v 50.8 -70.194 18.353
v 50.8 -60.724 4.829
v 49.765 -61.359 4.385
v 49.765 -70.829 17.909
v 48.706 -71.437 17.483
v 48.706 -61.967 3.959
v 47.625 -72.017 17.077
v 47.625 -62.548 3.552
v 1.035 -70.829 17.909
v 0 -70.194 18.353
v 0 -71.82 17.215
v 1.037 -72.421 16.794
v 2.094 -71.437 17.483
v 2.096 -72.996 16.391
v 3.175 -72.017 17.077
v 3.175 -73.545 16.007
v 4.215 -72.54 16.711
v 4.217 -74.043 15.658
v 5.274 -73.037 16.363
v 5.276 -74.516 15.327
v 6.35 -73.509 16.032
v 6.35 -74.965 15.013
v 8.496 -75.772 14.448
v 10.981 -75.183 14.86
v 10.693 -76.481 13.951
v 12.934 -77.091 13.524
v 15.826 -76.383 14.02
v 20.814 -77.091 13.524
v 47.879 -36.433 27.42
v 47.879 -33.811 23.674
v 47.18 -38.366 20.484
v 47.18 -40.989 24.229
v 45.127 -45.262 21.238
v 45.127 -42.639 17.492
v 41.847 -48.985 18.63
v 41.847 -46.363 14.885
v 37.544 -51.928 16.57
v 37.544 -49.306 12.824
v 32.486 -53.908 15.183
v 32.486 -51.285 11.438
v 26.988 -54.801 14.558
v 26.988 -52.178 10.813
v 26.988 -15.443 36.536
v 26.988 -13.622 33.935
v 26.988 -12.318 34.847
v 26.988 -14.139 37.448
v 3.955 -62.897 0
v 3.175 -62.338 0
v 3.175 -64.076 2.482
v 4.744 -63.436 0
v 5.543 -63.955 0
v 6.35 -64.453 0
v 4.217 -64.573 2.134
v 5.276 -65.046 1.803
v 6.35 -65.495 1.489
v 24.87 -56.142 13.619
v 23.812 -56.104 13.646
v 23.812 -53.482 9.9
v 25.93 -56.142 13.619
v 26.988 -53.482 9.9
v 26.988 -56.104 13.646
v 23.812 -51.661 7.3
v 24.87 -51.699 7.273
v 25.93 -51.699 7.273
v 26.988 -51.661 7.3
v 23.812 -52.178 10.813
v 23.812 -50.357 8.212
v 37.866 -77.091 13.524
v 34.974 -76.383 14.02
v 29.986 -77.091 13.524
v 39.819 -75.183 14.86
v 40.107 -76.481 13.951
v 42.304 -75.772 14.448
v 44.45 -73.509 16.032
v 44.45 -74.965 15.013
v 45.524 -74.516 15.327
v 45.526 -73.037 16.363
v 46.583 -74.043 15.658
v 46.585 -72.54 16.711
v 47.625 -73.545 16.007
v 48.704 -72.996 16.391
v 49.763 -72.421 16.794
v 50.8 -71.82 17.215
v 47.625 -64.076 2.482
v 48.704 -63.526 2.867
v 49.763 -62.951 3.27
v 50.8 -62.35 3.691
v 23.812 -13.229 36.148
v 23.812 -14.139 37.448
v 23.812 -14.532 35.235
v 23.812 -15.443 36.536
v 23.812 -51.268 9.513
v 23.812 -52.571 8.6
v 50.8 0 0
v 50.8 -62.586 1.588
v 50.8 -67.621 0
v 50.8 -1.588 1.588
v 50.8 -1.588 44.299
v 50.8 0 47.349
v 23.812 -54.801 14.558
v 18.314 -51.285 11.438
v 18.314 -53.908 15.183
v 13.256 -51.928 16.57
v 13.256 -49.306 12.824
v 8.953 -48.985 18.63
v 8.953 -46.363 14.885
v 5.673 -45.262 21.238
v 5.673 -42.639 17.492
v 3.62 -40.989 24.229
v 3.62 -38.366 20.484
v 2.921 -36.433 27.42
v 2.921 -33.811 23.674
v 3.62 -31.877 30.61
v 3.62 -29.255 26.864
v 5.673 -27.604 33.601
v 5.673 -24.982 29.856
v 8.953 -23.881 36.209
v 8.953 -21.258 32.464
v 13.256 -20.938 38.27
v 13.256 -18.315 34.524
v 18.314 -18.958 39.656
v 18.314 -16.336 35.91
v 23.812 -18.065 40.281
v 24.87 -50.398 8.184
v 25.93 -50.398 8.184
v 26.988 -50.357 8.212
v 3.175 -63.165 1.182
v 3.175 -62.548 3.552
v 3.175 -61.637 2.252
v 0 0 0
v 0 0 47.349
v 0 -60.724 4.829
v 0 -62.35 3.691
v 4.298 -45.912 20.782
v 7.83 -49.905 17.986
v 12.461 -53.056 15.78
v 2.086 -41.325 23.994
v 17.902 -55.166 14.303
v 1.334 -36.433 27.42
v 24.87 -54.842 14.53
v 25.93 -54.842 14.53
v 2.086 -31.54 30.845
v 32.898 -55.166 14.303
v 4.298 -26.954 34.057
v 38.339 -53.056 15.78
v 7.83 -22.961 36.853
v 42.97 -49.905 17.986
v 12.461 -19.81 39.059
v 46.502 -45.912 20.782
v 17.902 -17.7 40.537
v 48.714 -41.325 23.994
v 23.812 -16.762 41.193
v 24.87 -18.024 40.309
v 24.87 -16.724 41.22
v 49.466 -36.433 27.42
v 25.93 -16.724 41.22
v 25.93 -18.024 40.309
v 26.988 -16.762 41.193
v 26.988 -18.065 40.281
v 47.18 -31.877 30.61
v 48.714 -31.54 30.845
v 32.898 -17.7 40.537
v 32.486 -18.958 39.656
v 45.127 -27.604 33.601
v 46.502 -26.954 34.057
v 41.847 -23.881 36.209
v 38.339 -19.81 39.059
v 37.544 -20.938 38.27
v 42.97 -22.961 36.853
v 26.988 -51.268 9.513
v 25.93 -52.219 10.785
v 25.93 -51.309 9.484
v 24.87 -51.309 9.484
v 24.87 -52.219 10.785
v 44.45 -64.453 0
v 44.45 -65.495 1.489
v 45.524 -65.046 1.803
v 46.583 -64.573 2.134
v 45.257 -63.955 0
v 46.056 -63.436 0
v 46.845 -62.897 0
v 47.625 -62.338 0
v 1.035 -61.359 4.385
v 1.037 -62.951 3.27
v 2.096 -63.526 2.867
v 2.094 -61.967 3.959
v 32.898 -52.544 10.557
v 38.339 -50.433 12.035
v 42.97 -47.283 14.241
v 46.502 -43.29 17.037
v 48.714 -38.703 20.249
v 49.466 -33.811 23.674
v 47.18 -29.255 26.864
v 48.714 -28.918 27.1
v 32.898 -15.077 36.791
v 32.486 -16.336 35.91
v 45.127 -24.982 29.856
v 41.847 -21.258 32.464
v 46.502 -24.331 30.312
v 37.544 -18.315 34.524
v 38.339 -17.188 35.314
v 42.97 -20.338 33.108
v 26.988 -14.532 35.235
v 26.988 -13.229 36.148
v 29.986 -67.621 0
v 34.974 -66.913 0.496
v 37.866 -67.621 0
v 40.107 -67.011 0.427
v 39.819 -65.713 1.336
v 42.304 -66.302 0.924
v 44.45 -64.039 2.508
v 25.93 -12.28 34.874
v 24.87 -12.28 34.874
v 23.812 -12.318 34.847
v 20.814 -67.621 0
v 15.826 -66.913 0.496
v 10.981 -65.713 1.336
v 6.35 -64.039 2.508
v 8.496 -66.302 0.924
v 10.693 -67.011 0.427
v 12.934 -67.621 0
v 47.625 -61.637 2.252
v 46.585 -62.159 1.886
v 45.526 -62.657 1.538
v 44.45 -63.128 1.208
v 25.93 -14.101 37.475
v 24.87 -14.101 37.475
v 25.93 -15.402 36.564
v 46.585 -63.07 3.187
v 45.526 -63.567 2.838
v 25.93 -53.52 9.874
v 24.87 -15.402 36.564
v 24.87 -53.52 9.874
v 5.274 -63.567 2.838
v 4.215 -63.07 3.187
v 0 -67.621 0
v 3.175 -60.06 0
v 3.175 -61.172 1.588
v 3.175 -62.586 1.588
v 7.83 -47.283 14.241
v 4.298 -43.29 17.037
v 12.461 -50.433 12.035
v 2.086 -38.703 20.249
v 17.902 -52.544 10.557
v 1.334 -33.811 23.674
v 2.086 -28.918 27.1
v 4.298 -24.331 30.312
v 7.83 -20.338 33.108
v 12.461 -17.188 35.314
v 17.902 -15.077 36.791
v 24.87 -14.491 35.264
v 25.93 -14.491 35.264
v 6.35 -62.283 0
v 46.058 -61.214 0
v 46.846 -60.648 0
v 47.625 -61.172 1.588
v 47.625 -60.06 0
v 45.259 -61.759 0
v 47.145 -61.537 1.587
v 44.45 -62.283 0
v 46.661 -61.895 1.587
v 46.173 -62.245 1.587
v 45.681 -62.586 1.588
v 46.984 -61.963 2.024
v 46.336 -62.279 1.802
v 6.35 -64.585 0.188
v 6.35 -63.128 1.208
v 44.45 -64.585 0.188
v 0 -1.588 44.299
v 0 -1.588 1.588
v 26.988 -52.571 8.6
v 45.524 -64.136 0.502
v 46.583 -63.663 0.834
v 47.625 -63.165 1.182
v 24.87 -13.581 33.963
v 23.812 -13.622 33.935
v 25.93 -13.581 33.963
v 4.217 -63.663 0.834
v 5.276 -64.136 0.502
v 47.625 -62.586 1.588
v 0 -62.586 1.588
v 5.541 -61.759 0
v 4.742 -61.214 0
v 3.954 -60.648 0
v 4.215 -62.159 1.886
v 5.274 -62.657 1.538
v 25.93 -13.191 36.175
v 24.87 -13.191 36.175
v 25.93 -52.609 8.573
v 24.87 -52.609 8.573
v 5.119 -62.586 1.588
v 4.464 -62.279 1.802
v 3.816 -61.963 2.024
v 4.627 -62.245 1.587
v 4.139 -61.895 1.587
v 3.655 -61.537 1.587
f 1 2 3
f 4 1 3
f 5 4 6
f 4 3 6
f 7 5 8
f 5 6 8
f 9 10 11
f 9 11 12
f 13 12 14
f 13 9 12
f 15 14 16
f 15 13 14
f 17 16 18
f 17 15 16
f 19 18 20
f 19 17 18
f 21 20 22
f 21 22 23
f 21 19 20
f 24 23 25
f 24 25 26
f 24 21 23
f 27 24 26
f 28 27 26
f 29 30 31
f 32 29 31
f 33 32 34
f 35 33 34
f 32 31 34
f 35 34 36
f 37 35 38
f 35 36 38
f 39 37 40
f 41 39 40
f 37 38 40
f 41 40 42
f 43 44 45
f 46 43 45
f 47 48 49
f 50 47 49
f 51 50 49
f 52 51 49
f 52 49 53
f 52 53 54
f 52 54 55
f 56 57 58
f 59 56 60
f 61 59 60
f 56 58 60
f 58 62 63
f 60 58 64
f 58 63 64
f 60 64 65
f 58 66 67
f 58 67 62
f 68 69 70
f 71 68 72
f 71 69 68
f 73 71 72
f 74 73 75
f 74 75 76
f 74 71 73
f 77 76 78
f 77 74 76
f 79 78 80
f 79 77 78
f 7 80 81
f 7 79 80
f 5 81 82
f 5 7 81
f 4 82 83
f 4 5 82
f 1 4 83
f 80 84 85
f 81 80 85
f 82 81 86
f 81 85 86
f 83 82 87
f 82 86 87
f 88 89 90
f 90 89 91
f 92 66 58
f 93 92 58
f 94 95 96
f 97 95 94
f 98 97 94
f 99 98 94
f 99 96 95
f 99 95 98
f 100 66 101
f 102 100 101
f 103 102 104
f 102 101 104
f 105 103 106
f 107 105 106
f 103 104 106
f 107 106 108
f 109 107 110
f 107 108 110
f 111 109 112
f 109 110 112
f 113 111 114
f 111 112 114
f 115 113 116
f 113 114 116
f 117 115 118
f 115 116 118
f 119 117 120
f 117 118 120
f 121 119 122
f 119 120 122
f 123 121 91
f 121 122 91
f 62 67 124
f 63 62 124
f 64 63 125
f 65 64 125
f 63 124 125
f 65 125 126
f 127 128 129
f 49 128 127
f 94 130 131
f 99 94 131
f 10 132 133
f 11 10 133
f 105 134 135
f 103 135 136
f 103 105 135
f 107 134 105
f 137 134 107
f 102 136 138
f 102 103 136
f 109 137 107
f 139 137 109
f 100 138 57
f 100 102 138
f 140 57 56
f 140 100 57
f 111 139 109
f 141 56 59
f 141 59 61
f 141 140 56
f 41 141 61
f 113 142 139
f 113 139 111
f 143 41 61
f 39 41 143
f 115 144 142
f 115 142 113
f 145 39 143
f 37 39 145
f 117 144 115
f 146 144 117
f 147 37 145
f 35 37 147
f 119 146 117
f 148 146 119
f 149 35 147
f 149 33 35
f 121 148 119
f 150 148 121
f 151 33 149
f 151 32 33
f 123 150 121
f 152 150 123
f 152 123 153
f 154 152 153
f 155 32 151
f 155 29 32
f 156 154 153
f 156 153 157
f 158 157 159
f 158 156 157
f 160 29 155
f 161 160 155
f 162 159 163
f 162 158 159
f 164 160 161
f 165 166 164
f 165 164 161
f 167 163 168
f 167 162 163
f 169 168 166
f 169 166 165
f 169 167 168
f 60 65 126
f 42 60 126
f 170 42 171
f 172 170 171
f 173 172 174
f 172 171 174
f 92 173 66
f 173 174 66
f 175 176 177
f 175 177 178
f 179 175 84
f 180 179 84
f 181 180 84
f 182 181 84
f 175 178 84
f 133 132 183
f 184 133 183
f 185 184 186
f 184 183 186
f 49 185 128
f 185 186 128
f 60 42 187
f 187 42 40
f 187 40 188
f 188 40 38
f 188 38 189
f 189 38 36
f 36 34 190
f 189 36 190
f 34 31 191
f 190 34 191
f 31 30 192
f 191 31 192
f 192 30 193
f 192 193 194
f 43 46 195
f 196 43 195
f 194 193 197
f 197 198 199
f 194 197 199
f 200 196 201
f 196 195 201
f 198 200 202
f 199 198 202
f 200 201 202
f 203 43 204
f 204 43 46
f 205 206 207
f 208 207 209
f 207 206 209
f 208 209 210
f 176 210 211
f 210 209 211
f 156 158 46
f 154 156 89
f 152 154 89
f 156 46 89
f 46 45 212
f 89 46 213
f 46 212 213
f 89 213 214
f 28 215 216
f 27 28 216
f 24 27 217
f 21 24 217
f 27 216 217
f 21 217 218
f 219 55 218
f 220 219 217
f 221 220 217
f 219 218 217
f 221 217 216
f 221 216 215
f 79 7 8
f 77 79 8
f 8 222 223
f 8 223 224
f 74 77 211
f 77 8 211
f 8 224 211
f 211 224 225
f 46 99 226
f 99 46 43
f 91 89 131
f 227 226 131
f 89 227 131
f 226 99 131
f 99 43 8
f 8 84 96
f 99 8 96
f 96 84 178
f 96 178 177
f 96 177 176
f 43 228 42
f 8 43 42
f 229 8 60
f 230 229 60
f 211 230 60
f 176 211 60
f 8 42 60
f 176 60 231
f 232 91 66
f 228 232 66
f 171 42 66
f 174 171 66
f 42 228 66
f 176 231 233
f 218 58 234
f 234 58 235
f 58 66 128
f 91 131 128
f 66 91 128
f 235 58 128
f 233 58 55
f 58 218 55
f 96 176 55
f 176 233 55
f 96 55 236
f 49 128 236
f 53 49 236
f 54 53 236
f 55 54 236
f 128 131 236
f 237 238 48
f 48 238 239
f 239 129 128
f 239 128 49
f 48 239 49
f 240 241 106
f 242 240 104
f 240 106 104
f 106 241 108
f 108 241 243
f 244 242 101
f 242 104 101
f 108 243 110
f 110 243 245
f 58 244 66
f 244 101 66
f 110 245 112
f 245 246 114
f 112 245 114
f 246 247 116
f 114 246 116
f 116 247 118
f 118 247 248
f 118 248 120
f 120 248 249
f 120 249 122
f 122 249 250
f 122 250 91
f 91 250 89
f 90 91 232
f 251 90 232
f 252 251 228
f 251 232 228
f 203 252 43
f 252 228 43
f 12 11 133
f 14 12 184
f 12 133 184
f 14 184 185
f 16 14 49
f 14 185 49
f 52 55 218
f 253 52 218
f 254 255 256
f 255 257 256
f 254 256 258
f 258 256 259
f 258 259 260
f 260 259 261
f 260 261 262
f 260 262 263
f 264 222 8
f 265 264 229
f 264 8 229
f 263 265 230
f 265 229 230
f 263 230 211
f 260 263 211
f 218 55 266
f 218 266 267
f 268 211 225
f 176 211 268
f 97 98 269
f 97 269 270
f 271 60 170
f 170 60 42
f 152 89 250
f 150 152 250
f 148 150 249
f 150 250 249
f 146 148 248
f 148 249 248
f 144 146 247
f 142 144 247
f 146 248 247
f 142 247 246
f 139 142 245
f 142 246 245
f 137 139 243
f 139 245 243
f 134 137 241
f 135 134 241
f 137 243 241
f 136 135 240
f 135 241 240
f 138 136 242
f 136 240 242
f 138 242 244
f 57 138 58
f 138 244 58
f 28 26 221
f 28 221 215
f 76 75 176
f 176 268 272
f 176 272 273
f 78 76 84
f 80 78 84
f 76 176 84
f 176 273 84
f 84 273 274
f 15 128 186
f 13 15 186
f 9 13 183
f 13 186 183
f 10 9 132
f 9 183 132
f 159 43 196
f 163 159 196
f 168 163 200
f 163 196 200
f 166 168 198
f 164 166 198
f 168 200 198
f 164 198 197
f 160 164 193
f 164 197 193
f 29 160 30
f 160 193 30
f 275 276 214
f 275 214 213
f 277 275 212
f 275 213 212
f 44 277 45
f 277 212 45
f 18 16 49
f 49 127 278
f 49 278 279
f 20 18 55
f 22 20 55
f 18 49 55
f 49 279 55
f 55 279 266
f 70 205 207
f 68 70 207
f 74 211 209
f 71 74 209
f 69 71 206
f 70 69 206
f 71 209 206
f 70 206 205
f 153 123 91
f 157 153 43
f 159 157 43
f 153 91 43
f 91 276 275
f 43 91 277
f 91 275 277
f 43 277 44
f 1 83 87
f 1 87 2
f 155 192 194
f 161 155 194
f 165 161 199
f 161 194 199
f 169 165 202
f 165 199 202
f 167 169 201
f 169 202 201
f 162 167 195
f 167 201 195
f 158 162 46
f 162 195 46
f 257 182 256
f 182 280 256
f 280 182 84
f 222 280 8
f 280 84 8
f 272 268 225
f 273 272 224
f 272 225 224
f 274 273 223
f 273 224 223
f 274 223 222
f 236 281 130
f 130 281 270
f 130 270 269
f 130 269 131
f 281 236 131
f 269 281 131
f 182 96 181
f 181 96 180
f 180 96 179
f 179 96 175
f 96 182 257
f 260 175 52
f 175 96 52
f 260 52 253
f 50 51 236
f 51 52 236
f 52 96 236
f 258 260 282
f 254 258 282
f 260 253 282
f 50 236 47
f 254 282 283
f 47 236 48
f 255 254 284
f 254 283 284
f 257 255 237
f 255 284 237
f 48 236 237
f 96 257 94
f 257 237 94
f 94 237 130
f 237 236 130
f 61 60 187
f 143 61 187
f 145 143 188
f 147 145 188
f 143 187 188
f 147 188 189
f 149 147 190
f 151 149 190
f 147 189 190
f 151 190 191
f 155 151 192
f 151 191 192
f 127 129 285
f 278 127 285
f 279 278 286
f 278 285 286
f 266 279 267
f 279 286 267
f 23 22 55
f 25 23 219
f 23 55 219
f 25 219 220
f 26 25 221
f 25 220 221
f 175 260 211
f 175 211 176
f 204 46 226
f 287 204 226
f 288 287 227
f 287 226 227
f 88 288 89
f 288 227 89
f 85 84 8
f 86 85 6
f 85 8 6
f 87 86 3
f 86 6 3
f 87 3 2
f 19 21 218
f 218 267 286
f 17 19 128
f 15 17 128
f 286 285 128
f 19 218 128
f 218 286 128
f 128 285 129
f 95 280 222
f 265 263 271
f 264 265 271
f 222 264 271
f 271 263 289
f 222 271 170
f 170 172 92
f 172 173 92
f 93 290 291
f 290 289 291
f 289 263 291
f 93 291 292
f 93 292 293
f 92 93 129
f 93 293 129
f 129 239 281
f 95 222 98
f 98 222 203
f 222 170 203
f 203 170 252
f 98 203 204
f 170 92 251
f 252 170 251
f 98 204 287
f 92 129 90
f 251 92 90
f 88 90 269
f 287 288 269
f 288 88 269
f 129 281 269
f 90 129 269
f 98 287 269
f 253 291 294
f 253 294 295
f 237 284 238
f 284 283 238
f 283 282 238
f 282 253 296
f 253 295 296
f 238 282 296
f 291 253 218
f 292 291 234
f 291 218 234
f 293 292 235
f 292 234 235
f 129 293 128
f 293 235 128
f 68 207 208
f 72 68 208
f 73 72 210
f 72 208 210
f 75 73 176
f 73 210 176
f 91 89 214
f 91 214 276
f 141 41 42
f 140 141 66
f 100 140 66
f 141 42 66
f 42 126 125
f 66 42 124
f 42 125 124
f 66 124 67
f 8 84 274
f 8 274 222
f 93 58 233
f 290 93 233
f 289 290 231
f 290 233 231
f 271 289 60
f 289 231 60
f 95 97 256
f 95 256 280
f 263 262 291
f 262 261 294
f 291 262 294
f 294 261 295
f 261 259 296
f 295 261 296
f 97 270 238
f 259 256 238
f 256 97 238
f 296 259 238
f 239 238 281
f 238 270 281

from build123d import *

# Parameters (mm, degrees)
F1_DEPTH = 50.8
F3_DEPTH = 1.5875
F4_DEPTH = 3.175
F5_DEPTH = 4.572
F6_DEPTH = 4.3377795607
F7_DEPTH = 1.5875
F8_DEPTH = 16.51


with BuildPart() as f1:
    # F0 (on Right) → F1 (new body)
    with BuildSketch(Plane.YZ):
        Polygon((-67.6210012561, 0), (0, 0), (0, 47.3487348208), align=None)
        Polygon((-62.5860945073, 1.5875), (-1.5875, 44.2991756942), (-1.5875, 1.5875), align=None, mode=Mode.SUBTRACT)
    extrude(amount=F1_DEPTH)

    # F2 (on face) → F3 (cut, through all)
    with BuildSketch(Plane(origin=(0, -22.2466283573, 31.7714779452), x_dir=(1, 0, 0), z_dir=(0, -0.5735764364, 0.8191520443))):
        with BuildLine():
            Line((26.9875, -38.1309661579), (26.9875, -36.5397555569))
            ThreePointArc((26.9875, -36.5397555569), (25.4, -36.5958814158), (23.8125, -36.5397555569))
            Line((23.8125, -36.5397555569), (23.8125, -38.1309661579))
            ThreePointArc((23.8125, -38.1309661579), (25.4, -38.1833814158), (26.9875, -38.1309661579))
        make_face()
        with BuildLine():
            ThreePointArc((23.8125, 8.3059927254), (25.4, 8.3621185842), (26.9875, 8.3059927254))
            Line((26.9875, 8.3059927254), (26.9875, 9.8972033263))
            ThreePointArc((26.9875, 9.8972033263), (25.4, 9.9496185842), (23.8125, 9.8972033263))
            Line((23.8125, 9.8972033263), (23.8125, 8.3059927254))
        make_face()
    extrude(amount=-F3_DEPTH, mode=Mode.SUBTRACT)

    # F2 (on face) → F6 (cut, through all)
    with BuildSketch(Plane(origin=(0, -22.2466283573, 31.7714779452), x_dir=(1, 0, 0), z_dir=(0, -0.5735764364, 0.8191520443))):
        with BuildLine():
            ThreePointArc((47.625, -49.1983183305), (46.0575649781, -50.1435777696), (44.45, -51.0188507535))
            Line((44.45, -51.0188507535), (44.45, -52.7967220598))
            ThreePointArc((44.45, -52.7967220598), (46.0556790515, -51.9636183315), (47.625, -51.0638968196))
            Line((47.625, -51.0638968196), (47.625, -49.1983183305))
        make_face()
        with BuildLine():
            ThreePointArc((6.35, -51.0188507535), (4.7424350219, -50.1435777696), (3.175, -49.1983183305))
            Line((3.175, -49.1983183305), (3.175, -51.0638968196))
            ThreePointArc((3.175, -51.0638968196), (4.7443209485, -51.9636183315), (6.35, -52.7967220598))
            Line((6.35, -52.7967220598), (6.35, -51.0188507535))
        make_face()
    extrude(amount=-F6_DEPTH, mode=Mode.SUBTRACT)


with BuildPart() as f4:
    # F2 (on face) → F4 (new body)
    with BuildSketch(Plane(origin=(0, -22.2466283573, 31.7714779452), x_dir=(1, 0, 0), z_dir=(0, -0.5735764364, 0.8191520443))):
        with BuildLine():
            ThreePointArc((23.8125, 8.3059927254), (25.4, 8.3621185842), (26.9875, 8.3059927254))
            Line((26.9875, 8.3059927254), (26.9875, 9.8972033263))
            ThreePointArc((26.9875, 9.8972033263), (25.4, 9.9496185842), (23.8125, 9.8972033263))
            Line((23.8125, 9.8972033263), (23.8125, 8.3059927254))
        make_face()
    extrude(amount=-F4_DEPTH)



with BuildPart() as f4b:
    # F2 (on face) → F4, piece 2 (new body)
    with BuildSketch(Plane(origin=(0, -22.2466283573, 31.7714779452), x_dir=(1, 0, 0), z_dir=(0, -0.5735764364, 0.8191520443))):
        with BuildLine():
            Line((26.9875, -38.1309661579), (26.9875, -36.5397555569))
            ThreePointArc((26.9875, -36.5397555569), (25.4, -36.5958814158), (23.8125, -36.5397555569))
            Line((23.8125, -36.5397555569), (23.8125, -38.1309661579))
            ThreePointArc((23.8125, -38.1309661579), (25.4, -38.1833814158), (26.9875, -38.1309661579))
        make_face()
    extrude(amount=-F4_DEPTH)


with BuildPart() as f4_1:
    add(f4.part)

    add(f4b.part)  # F5 merges F4b
    # F2 (on face) → F5 (join)
    with BuildSketch(Plane(origin=(0, -22.2466283573, 31.7714779452), x_dir=(1, 0, 0), z_dir=(0, -0.5735764364, 0.8191520443))):
        with BuildLine():
            ThreePointArc((26.9875, 8.3059927254), (41.8467451719, 1.2066303962), (47.879, -14.1168814158))
            ThreePointArc((47.879, -14.1168814158), (41.8467451719, -29.4403932277), (26.9875, -36.5397555569))
            Line((26.9875, -36.5397555569), (26.9875, -38.1309661579))
            ThreePointArc((26.9875, -38.1309661579), (42.969888887, -30.5636265877), (49.4665, -14.1168814158))
            ThreePointArc((49.4665, -14.1168814158), (42.969888887, 2.3298637562), (26.9875, 9.8972033263))
            Line((26.9875, 9.8972033263), (26.9875, 8.3059927254))
        make_face()
        with BuildLine():
            Line((26.9875, -38.1309661579), (26.9875, -36.5397555569))
            ThreePointArc((26.9875, -36.5397555569), (25.4, -36.5958814158), (23.8125, -36.5397555569))
            Line((23.8125, -36.5397555569), (23.8125, -38.1309661579))
            ThreePointArc((23.8125, -38.1309661579), (25.4, -38.1833814158), (26.9875, -38.1309661579))
        make_face()
        with BuildLine():
            ThreePointArc((23.8125, -36.5397555569), (2.921, -14.1168814158), (23.8125, 8.3059927254))
            Line((23.8125, 8.3059927254), (23.8125, 9.8972033263))
            ThreePointArc((23.8125, 9.8972033263), (1.3335, -14.1168814158), (23.8125, -38.1309661579))
            Line((23.8125, -38.1309661579), (23.8125, -36.5397555569))
        make_face()
        with BuildLine():
            ThreePointArc((23.8125, 8.3059927254), (25.4, 8.3621185842), (26.9875, 8.3059927254))
            Line((26.9875, 8.3059927254), (26.9875, 9.8972033263))
            ThreePointArc((26.9875, 9.8972033263), (25.4, 9.9496185842), (23.8125, 9.8972033263))
            Line((23.8125, 9.8972033263), (23.8125, 8.3059927254))
        make_face()
    extrude(amount=F5_DEPTH)


with BuildPart() as f7:
    # F2 (on face) → F7 (new body)
    with BuildSketch(Plane(origin=(0, -22.2466283573, 31.7714779452), x_dir=(1, 0, 0), z_dir=(0, -0.5735764364, 0.8191520443))):
        with BuildLine():
            ThreePointArc((47.625, -49.1983183305), (46.0575649781, -50.1435777696), (44.45, -51.0188507535))
            Line((44.45, -51.0188507535), (44.45, -52.7967220598))
            ThreePointArc((44.45, -52.7967220598), (46.0556790515, -51.9636183315), (47.625, -51.0638968196))
            Line((47.625, -51.0638968196), (47.625, -49.1983183305))
        make_face()
    extrude(amount=-F7_DEPTH)



with BuildPart() as f7b:
    # F2 (on face) → F7, piece 2 (new body)
    with BuildSketch(Plane(origin=(0, -22.2466283573, 31.7714779452), x_dir=(1, 0, 0), z_dir=(0, -0.5735764364, 0.8191520443))):
        with BuildLine():
            ThreePointArc((6.35, -51.0188507535), (4.7424350219, -50.1435777696), (3.175, -49.1983183305))
            Line((3.175, -49.1983183305), (3.175, -51.0638968196))
            ThreePointArc((3.175, -51.0638968196), (4.7443209485, -51.9636183315), (6.35, -52.7967220598))
            Line((6.35, -52.7967220598), (6.35, -51.0188507535))
        make_face()
    extrude(amount=-F7_DEPTH)


with BuildPart() as f7_1:
    add(f7.part)

    add(f7b.part)  # F8 merges F7b
    # F2 (on face) → F8 (join)
    with BuildSketch(Plane(origin=(0, -22.2466283573, 31.7714779452), x_dir=(1, 0, 0), z_dir=(0, -0.5735764364, 0.8191520443))):
        with BuildLine():
            ThreePointArc((3.175, -49.1983183305), (1.561509725, -48.1225312759), (0, -46.9725938719))
            Line((0, -46.9725938719), (0, -48.9575555231))
            ThreePointArc((0, -48.9575555231), (1.5642217525, -50.0458147089), (3.175, -51.0638968196))
            Line((3.175, -51.0638968196), (3.175, -49.1983183305))
        make_face()
        with BuildLine():
            ThreePointArc((6.35, -51.0188507535), (4.7424350219, -50.1435777696), (3.175, -49.1983183305))
            Line((3.175, -49.1983183305), (3.175, -51.0638968196))
            ThreePointArc((3.175, -51.0638968196), (4.7443209485, -51.9636183315), (6.35, -52.7967220598))
            Line((6.35, -52.7967220598), (6.35, -51.0188507535))
        make_face()
        with BuildLine():
            ThreePointArc((20.8139105983, -55.3918814158), (13.3813881898, -53.8687469211), (6.35, -51.0188507535))
            Line((6.35, -51.0188507535), (6.35, -52.7967220598))
            ThreePointArc((6.35, -52.7967220598), (9.5885504366, -54.2296055186), (12.9337677204, -55.3918814158))
            Line((12.9337677204, -55.3918814158), (20.8139105983, -55.3918814158))
        make_face()
        with BuildLine():
            ThreePointArc((44.45, -51.0188507535), (37.4186118102, -53.8687469211), (29.9860894017, -55.3918814158))
            Line((29.9860894017, -55.3918814158), (37.8662322796, -55.3918814158))
            ThreePointArc((37.8662322796, -55.3918814158), (41.2114495634, -54.2296055186), (44.45, -52.7967220598))
            Line((44.45, -52.7967220598), (44.45, -51.0188507535))
        make_face()
        with BuildLine():
            ThreePointArc((47.625, -49.1983183305), (46.0575649781, -50.1435777696), (44.45, -51.0188507535))
            Line((44.45, -51.0188507535), (44.45, -52.7967220598))
            ThreePointArc((44.45, -52.7967220598), (46.0556790515, -51.9636183315), (47.625, -51.0638968196))
            Line((47.625, -51.0638968196), (47.625, -49.1983183305))
        make_face()
        with BuildLine():
            Line((50.8, -48.9575555231), (50.8, -46.9725938719))
            ThreePointArc((50.8, -46.9725938719), (49.238490275, -48.1225312759), (47.625, -49.1983183305))
            Line((47.625, -49.1983183305), (47.625, -51.0638968196))
            ThreePointArc((47.625, -51.0638968196), (49.2357782475, -50.0458147089), (50.8, -48.9575555231))
        make_face()
    extrude(amount=F8_DEPTH)


solid = Compound([f1.part, f4_1.part, f7_1.part])
